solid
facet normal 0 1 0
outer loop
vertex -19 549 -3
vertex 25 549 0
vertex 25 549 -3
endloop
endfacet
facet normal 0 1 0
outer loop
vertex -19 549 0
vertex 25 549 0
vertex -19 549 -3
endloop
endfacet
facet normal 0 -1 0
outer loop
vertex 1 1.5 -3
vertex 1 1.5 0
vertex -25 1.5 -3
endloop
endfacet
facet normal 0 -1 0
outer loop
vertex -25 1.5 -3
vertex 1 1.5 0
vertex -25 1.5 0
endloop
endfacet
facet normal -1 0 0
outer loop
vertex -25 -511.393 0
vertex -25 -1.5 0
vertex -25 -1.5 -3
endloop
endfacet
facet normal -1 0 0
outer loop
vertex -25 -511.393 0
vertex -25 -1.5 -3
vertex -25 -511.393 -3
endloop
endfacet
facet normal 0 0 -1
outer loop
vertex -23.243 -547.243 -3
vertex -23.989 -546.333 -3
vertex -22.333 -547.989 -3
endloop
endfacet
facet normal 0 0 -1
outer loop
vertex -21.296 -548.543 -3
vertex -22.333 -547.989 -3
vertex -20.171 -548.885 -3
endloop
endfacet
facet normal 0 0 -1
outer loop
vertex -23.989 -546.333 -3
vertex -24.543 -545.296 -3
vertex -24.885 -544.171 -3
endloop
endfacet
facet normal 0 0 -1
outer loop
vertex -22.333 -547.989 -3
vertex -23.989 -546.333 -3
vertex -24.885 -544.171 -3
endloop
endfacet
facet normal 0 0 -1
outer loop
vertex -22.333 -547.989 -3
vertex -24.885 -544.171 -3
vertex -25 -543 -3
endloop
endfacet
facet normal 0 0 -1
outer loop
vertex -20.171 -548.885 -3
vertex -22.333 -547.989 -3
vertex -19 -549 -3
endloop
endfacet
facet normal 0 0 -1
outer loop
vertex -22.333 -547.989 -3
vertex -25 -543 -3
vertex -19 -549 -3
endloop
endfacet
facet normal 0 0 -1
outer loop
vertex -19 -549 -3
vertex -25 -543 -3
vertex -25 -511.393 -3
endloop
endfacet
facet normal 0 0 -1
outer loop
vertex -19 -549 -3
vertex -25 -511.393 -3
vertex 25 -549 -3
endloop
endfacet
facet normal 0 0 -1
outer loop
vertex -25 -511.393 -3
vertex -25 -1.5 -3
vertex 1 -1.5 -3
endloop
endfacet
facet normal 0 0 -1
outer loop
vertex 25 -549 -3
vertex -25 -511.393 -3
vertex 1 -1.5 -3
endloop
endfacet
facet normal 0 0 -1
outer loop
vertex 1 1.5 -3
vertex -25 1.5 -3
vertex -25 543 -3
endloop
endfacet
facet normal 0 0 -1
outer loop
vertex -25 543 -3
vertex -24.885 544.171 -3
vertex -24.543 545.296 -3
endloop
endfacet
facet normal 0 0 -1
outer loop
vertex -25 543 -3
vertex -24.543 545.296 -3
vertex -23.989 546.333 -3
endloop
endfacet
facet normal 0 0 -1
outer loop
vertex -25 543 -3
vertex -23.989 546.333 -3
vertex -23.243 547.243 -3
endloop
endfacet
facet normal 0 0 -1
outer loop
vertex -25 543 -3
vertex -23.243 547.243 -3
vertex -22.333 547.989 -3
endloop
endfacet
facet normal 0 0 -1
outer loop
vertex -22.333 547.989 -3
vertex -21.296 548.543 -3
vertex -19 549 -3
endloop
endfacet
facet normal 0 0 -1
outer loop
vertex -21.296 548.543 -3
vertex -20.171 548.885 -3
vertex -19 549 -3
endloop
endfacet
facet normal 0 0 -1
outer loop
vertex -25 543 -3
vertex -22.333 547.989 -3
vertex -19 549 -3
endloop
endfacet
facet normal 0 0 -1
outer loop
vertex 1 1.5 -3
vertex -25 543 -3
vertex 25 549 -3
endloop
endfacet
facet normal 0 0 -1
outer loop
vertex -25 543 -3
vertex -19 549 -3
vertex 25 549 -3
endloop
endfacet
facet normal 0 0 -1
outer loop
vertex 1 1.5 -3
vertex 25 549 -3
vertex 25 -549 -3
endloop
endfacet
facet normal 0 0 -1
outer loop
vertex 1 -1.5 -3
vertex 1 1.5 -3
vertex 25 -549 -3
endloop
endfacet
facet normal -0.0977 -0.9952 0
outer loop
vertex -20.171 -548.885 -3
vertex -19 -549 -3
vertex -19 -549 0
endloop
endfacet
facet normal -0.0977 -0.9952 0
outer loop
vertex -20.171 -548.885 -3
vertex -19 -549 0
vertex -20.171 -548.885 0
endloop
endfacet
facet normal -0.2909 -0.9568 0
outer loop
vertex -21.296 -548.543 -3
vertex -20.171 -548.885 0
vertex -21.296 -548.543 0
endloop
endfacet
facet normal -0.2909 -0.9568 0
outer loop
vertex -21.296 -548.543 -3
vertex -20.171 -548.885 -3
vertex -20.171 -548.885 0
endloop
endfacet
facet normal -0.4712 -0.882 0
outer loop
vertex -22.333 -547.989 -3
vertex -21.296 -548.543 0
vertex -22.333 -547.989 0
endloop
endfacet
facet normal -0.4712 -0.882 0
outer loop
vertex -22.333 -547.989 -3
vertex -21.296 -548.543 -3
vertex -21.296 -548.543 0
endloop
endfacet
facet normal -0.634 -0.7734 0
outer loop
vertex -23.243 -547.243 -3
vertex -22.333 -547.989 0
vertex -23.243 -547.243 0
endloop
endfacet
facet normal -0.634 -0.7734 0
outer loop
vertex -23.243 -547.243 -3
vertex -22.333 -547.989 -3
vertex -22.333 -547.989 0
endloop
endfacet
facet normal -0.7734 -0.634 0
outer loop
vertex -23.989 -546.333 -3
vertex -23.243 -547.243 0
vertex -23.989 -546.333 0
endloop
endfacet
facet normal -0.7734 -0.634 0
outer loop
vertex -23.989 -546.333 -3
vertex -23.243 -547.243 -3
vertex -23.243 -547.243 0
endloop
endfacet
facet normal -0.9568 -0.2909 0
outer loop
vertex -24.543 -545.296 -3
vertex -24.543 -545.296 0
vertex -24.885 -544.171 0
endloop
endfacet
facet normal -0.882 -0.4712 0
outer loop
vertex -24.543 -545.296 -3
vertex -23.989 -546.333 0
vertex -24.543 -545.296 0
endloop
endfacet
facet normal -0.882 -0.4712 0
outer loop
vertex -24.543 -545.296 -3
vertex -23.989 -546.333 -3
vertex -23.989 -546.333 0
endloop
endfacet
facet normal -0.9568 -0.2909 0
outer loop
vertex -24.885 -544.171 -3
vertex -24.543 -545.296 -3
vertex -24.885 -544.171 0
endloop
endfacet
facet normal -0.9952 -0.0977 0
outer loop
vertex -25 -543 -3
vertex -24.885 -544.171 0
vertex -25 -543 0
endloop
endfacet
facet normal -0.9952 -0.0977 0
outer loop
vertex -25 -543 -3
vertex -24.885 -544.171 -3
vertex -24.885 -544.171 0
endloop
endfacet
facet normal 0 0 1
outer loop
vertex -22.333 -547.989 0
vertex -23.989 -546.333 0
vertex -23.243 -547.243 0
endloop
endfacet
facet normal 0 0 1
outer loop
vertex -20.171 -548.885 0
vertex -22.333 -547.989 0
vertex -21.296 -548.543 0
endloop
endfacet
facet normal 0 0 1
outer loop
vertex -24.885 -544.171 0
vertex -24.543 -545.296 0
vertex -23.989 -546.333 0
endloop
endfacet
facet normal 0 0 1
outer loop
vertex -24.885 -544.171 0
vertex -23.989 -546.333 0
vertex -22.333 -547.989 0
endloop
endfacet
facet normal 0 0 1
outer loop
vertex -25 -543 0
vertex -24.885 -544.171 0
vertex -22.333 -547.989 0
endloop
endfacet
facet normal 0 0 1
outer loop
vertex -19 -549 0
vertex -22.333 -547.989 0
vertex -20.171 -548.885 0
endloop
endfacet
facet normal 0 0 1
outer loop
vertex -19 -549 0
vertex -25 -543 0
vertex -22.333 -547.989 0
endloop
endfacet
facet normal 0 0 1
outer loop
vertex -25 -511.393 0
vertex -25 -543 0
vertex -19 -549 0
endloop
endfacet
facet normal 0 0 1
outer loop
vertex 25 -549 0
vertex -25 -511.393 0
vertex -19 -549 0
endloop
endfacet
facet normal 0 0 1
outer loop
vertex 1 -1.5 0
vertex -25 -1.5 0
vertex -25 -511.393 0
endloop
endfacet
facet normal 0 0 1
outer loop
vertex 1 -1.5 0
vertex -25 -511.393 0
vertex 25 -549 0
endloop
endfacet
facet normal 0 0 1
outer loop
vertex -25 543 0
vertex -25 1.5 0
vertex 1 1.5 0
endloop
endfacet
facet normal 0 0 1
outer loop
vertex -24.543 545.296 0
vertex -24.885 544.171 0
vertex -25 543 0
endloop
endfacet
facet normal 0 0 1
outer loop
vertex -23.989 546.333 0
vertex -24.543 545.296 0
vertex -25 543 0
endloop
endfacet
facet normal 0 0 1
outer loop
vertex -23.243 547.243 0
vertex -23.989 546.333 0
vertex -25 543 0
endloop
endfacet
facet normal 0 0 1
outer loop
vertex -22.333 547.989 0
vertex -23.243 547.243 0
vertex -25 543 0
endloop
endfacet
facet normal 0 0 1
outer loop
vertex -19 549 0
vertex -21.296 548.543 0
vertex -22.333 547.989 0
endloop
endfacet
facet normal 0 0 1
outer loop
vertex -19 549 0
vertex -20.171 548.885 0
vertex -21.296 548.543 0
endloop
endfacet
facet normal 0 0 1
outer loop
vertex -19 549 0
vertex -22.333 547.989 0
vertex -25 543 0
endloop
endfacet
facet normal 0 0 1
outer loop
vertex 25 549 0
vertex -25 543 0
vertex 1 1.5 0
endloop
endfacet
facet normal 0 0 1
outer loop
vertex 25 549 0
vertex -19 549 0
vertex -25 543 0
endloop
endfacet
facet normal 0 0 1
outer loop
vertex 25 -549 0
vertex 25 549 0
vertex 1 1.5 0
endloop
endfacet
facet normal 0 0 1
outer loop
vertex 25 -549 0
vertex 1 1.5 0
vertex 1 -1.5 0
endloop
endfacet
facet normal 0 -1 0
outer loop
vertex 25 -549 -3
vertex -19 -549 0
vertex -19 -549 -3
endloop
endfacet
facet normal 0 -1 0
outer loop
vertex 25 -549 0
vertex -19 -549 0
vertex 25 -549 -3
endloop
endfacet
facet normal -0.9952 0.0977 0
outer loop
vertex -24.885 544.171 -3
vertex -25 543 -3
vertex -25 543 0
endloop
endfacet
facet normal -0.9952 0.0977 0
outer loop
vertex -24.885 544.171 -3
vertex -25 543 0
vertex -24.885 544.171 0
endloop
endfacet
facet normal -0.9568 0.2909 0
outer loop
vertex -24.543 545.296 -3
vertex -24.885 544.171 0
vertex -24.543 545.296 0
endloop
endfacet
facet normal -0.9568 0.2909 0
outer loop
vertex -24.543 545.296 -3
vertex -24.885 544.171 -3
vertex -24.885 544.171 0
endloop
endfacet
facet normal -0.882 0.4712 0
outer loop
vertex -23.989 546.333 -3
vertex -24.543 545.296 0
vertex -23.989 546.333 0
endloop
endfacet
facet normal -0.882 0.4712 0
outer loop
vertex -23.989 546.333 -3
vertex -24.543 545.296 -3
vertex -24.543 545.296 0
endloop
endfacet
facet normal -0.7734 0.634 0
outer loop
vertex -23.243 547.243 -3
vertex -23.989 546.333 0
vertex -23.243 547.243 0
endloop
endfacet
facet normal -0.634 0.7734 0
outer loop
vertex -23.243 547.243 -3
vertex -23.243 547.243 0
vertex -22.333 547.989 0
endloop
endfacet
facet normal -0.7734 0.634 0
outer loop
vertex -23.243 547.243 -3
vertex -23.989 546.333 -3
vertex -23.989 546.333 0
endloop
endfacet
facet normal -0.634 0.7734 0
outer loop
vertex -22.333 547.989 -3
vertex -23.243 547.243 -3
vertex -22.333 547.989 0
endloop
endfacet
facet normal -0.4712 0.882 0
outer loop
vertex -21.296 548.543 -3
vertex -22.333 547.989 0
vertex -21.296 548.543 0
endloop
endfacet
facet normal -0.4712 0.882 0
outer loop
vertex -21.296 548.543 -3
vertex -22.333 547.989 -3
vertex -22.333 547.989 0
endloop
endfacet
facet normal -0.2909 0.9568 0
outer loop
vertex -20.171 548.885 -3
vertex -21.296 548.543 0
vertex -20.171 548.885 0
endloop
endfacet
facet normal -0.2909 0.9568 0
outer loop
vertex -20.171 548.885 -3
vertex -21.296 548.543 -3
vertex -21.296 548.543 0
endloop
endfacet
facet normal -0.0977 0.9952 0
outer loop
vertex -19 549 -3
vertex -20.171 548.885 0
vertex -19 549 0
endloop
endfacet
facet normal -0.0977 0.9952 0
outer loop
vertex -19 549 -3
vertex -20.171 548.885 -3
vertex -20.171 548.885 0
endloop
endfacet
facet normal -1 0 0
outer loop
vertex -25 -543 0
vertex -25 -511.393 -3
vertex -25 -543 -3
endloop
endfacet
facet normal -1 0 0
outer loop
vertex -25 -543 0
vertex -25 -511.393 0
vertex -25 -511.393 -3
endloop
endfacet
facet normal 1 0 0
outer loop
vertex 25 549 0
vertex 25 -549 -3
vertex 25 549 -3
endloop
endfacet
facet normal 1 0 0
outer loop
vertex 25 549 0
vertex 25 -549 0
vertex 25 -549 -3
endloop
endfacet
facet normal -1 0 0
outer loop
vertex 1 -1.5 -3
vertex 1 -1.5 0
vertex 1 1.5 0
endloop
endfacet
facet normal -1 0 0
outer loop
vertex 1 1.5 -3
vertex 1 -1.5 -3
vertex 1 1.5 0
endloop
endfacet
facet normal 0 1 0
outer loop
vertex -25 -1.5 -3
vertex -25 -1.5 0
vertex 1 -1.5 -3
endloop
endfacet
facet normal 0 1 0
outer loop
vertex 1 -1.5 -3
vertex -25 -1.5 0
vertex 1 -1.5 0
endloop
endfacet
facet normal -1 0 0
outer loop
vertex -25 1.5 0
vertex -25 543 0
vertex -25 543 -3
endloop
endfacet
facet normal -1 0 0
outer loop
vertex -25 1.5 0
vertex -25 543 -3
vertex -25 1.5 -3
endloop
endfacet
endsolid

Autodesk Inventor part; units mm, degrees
ref_plane "YZ Plane" through (0, 0, 0) normal (1, 0, 0) x (0, 1, 0)
ref_plane "XZ Plane" through (0, 0, 0) normal (0, 1, 0) x (-1, 0, 0)
ref_plane "XY Plane" through (0, 0, 0) normal (0, 0, 1) x (1, 0, 0)
sketch "Sketch1" plane through (0, 0, 0) normal (0, 0, 1) x (1, 0, 0)
  line L0 (-25, -549) -> (25, -549)
  line L1 (25, -549) -> (25, 549)
  line L2 (25, 549) -> (-25, 549)
  line L3 (-25, 549) -> (-25, -549)
  line L4 (-25, -549) -> (-25, -511.3932)
  line L5 (-25, -549) -> (25, 549) construction
  line L6 (-25, -1.5) -> (1, -1.5)
  line L7 (1, -1.5) -> (1, 1.5)
  line L8 (1, 1.5) -> (-25, 1.5)
  line L9 (-25, 1.5) -> (-25, -1.5)
  point P0 (0, 0)
  point P1 (0, 0)
  point P2 (-25, 0)
  dimension "d17" = 1098
  dimension "d18" = 50
  dimension "d19" = 3
  dimension "d20" = 26
extrude "Plate2" add sketch "Sketch1" against normal blind 3 contours L3 L6 L7 L8 L2 L1 L0
fillet "Corner Round1" radius 6 2 edges at (-25, -549, -1.5) (-25, 549, -1.5)
equation "\"d18\" = Ширина_креста"
equation "\"d19\" = Thickness"
equation "\"d15\" = Thickness"
equation "\"BendReliefWidth\" = Thickness"
equation "\"BendReliefDepth\" = 0.5 * Thickness"
equation "\"CornerReliefSize\" = 4 * Thickness"
equation "\"MinimumRemnant\" = 2 * Thickness"
equation "\"TransitionRadius\" = BendRadius"
equation "\"JacobiRadiusSize\" = BendRadius"
equation "\"GapSize\" = Thickness"
equation "\"Ширина_креста\" = 50"
equation "\"Thickness\" = 3"
equation "\"BendRadius\" = 5"
properties part number "BSH 505 amplifier" material "Stainless Steel"
